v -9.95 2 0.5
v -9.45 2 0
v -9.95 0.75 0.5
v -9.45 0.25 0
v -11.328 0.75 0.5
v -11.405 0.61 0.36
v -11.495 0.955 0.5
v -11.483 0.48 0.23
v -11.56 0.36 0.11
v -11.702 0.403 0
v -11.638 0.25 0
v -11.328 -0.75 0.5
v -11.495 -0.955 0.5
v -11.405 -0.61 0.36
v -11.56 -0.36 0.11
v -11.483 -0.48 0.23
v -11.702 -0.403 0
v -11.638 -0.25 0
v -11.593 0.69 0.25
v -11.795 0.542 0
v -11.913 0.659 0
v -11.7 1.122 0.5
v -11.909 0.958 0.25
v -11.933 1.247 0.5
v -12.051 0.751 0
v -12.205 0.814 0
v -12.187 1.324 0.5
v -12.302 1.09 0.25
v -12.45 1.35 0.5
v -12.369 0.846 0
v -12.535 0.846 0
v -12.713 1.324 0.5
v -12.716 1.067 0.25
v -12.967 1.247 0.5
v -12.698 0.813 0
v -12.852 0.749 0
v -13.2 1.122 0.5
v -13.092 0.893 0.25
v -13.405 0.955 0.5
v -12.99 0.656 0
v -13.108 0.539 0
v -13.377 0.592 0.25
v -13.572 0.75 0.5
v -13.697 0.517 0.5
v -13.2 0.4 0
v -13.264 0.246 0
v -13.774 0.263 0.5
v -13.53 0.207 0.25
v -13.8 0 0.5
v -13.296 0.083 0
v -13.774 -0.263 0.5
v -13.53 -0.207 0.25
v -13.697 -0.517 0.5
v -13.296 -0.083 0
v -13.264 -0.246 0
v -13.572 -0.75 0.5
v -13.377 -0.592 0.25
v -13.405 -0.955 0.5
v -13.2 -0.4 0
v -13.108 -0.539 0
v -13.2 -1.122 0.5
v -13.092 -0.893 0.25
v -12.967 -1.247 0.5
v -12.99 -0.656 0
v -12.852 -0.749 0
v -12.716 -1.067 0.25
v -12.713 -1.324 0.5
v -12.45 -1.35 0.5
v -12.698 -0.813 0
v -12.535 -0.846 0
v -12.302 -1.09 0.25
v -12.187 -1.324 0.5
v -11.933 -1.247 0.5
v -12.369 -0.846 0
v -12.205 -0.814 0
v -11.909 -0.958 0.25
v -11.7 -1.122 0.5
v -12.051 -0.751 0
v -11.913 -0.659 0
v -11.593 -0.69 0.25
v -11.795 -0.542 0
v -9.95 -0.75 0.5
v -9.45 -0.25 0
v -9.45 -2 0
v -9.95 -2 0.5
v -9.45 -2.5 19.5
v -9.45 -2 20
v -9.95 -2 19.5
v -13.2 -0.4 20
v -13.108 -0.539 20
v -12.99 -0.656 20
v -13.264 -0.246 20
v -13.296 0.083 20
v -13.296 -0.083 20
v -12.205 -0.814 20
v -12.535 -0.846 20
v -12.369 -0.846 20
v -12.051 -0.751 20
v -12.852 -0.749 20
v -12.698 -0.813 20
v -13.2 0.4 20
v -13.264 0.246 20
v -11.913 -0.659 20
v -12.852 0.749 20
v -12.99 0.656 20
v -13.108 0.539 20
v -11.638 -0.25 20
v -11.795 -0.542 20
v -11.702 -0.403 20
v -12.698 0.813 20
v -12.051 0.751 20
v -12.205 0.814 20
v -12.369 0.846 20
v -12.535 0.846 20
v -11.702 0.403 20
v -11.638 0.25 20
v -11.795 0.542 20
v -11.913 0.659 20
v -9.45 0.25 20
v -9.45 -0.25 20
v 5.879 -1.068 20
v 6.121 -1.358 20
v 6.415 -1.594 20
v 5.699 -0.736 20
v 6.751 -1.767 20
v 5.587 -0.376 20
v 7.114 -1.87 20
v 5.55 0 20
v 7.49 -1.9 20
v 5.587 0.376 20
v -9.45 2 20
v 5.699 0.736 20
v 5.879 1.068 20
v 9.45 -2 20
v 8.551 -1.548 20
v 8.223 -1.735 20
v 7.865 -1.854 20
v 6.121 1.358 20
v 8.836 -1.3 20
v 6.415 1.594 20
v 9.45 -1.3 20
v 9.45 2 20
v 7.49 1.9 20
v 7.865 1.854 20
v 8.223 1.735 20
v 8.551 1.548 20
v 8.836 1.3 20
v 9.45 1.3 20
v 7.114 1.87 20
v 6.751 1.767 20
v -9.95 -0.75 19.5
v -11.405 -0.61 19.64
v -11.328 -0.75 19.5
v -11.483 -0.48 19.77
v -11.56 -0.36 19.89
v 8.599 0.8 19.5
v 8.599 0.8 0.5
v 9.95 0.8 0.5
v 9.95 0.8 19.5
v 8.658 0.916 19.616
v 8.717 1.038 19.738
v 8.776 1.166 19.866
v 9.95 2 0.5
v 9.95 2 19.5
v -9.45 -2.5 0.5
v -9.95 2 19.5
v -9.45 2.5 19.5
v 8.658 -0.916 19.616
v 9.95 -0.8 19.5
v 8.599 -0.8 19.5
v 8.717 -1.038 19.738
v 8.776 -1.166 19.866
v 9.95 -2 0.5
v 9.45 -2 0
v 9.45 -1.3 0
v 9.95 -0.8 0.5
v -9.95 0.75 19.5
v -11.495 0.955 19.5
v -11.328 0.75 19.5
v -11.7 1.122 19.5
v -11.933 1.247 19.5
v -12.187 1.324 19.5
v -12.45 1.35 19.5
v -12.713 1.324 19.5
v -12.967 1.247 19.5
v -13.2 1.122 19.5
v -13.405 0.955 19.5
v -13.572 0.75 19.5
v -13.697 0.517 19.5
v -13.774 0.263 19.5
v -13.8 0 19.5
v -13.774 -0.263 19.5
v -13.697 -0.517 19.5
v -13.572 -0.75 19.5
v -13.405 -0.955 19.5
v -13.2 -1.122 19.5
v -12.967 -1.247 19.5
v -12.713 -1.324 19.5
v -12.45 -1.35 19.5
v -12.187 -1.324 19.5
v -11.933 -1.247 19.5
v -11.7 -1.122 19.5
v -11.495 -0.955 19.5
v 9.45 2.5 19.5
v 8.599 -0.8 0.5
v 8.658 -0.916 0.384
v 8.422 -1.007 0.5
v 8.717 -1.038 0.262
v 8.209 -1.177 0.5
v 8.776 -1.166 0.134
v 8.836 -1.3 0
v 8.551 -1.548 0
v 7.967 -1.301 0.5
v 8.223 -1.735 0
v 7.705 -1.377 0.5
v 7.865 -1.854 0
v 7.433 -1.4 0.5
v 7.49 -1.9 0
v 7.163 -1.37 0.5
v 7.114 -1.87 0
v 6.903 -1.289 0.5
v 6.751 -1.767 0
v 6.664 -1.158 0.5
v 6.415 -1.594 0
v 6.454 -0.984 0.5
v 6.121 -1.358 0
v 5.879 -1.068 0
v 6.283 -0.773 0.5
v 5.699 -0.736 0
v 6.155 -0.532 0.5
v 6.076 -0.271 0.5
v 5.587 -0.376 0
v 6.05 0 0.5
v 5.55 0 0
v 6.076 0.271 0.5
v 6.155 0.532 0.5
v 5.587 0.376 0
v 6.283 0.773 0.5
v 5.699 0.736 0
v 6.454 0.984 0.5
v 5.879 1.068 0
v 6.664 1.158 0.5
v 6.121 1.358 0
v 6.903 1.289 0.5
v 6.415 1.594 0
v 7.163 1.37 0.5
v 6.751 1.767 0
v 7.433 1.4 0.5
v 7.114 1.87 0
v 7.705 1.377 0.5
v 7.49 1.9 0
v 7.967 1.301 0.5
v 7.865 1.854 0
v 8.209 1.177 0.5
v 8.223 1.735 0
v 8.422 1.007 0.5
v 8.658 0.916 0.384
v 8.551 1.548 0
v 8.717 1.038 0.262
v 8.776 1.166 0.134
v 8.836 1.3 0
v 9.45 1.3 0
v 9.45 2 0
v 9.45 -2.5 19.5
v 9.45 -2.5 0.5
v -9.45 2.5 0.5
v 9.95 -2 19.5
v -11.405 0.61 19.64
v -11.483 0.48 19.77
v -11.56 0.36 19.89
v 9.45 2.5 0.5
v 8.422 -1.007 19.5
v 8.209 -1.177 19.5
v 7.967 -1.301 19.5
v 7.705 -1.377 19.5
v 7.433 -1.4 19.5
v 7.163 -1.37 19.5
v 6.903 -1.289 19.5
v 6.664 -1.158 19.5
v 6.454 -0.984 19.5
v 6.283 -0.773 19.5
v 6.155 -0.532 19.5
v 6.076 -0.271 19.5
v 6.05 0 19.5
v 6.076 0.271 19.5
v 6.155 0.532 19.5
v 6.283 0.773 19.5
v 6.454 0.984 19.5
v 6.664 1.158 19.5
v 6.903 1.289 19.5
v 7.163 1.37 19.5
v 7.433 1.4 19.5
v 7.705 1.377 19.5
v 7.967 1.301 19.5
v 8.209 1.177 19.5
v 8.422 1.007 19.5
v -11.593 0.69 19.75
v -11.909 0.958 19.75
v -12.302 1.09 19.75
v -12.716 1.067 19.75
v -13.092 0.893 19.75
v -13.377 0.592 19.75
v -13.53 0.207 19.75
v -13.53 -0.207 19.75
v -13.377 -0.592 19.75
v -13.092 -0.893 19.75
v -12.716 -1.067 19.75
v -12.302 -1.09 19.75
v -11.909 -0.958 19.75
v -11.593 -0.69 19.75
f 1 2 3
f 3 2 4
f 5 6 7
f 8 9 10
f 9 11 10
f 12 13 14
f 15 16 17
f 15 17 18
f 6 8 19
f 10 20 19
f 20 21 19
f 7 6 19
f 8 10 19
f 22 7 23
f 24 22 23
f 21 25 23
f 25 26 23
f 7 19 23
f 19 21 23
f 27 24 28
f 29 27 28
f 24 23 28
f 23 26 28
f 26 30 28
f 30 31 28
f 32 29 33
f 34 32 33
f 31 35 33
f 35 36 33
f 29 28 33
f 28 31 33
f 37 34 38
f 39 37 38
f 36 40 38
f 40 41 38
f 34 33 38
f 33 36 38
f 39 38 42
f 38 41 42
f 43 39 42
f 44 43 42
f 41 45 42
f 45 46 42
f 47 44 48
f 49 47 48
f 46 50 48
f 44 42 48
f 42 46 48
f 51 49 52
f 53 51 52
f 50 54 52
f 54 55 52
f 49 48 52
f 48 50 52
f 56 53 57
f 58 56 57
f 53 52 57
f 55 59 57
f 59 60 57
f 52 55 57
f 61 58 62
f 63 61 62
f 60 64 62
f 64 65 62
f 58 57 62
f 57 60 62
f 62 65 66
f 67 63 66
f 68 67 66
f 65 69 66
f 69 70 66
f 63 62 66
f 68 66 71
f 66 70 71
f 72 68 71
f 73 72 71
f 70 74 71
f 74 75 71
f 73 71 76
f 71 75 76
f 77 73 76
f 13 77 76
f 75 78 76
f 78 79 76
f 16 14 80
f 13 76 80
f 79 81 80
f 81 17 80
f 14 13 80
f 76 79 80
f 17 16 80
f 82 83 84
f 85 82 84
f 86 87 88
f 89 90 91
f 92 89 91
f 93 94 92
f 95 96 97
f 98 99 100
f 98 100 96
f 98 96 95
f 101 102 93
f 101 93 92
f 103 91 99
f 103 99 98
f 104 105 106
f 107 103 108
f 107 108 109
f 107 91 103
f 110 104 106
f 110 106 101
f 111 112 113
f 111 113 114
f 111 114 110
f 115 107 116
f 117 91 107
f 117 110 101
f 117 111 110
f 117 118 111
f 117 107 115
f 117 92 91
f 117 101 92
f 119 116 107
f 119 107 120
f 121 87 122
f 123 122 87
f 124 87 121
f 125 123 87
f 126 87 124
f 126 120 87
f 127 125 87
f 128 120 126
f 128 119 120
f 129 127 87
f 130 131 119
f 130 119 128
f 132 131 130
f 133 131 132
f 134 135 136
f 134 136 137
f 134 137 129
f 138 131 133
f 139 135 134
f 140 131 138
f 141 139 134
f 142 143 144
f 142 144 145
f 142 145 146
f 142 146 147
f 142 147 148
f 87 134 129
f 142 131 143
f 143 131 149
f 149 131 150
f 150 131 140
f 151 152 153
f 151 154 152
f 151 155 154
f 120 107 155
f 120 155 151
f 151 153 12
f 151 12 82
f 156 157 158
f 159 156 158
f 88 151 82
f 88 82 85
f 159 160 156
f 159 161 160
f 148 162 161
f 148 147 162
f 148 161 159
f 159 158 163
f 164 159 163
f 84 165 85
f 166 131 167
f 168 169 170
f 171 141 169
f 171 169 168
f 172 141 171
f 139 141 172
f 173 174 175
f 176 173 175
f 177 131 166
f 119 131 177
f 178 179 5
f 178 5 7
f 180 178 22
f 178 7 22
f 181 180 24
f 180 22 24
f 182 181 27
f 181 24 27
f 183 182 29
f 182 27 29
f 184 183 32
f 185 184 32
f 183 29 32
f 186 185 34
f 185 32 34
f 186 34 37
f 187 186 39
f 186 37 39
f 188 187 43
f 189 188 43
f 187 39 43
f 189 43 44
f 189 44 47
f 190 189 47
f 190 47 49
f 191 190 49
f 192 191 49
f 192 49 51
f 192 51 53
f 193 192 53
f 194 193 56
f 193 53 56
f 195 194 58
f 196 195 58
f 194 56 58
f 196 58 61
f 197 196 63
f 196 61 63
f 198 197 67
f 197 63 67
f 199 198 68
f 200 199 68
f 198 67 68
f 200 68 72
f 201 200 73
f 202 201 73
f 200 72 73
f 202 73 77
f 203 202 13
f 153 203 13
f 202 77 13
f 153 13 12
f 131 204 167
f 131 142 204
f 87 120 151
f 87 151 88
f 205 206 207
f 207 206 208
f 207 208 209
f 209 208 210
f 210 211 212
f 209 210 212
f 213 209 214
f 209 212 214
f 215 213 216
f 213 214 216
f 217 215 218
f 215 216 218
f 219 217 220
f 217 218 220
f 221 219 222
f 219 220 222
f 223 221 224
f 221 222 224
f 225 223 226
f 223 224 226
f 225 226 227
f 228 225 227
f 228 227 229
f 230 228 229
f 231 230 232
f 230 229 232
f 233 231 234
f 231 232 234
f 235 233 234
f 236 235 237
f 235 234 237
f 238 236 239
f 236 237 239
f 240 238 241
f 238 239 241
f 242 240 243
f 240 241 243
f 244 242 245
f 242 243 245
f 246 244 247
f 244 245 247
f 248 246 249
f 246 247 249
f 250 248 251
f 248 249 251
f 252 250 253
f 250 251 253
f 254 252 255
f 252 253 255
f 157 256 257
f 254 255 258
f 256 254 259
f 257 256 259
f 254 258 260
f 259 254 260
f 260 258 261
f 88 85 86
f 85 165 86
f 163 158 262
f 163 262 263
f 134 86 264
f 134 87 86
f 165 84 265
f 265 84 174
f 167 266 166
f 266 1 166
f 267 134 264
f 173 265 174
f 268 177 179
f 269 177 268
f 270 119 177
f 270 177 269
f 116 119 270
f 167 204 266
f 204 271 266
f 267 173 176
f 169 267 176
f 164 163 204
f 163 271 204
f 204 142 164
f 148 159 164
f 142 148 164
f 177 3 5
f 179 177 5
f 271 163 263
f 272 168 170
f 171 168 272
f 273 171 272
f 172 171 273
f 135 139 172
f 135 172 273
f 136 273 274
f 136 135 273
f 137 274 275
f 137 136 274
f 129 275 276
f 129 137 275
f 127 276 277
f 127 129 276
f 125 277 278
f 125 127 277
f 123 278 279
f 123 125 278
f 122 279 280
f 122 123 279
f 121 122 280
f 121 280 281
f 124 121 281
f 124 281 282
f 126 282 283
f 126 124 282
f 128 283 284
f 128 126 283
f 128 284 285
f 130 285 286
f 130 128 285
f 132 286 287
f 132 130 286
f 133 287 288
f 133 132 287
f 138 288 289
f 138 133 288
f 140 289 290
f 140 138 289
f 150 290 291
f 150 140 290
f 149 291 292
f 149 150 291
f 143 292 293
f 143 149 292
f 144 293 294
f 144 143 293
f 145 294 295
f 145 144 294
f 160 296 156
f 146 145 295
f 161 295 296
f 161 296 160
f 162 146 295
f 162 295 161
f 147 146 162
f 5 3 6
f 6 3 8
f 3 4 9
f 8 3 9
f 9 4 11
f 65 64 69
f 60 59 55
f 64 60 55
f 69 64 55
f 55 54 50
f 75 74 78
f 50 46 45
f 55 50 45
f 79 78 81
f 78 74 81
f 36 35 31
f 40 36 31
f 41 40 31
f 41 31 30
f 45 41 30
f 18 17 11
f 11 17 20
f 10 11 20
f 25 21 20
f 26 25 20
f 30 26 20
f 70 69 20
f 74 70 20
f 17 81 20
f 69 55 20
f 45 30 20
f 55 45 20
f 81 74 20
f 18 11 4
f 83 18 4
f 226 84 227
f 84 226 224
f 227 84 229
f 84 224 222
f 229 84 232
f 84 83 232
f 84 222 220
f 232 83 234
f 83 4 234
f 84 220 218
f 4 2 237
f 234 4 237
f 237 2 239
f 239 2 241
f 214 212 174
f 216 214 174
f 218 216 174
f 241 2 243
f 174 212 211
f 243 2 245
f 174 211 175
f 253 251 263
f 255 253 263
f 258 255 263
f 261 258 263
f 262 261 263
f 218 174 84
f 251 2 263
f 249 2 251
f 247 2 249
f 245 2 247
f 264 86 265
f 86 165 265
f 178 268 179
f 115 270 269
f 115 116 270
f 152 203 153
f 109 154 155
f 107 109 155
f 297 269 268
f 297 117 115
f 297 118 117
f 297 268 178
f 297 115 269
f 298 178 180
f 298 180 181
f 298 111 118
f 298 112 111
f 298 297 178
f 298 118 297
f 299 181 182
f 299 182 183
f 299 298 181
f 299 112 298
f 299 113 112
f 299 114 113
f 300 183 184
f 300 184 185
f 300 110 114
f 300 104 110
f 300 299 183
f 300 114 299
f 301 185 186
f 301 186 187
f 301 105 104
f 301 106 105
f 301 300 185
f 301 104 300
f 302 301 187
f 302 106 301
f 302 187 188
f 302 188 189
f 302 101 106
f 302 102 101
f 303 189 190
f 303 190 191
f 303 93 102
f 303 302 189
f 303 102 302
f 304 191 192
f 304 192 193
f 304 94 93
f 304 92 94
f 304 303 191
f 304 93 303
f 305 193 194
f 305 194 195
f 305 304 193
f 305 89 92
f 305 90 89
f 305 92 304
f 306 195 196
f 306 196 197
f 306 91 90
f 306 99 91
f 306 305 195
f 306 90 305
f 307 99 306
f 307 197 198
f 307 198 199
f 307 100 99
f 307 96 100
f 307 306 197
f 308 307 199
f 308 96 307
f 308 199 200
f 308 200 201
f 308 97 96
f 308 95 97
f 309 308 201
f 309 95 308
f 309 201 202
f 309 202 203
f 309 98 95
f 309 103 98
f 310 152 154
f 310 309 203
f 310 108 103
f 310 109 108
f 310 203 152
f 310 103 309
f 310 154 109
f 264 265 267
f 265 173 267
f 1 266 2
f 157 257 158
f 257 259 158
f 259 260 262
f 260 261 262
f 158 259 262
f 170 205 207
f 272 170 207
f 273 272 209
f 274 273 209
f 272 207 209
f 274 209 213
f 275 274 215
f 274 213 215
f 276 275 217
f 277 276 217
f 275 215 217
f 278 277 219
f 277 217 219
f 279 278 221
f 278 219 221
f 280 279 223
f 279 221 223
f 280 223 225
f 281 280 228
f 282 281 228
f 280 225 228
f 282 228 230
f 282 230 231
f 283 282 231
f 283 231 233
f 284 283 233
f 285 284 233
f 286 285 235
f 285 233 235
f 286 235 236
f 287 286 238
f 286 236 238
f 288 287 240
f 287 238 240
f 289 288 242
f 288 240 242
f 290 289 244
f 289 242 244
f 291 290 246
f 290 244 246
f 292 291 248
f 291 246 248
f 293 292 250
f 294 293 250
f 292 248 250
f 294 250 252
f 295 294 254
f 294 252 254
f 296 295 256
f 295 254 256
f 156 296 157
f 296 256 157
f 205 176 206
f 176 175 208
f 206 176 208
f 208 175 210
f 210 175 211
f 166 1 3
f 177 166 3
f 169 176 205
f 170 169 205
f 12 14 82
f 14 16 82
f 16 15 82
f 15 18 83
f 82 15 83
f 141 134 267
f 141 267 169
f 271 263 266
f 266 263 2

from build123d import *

# Parameters (mm, degrees)
F1_DEPTH = 20
F2_SIZE  = 0.5


with BuildPart() as f1:
    # F0 (on Top) → F1 (new body)
    with BuildSketch(Plane.XY):
        with BuildLine():
            Line((9.95, 2.5), (-9.95, 2.5))
            Line((-9.95, 2.5), (-9.95, 0.75))
            Line((-9.95, 0.75), (-9.95, 0))
            Line((-9.95, 0), (-9.95, -0.75))
            Line((-9.95, -0.75), (-9.95, -2.5))
            Line((-9.95, -2.5), (9.95, -2.5))
            Line((9.95, -2.5), (9.95, -0.8))
            Line((9.95, -0.8), (8.5989125293, -0.8))
            ThreePointArc((8.5989125293, -0.8), (6.05, 0), (8.5989125293, 0.8))
            Line((8.5989125293, 0.8), (9.95, 0.8))
            Line((9.95, 0.8), (9.95, 2.5))
        make_face()
        with BuildLine():
            Line((-9.95, 0), (-9.95, 0.75))
            Line((-9.95, 0.75), (-11.327502784, 0.75))
            ThreePointArc((-11.327502784, 0.75), (-11.158127088, 0.391872912), (-11.1, 0))
            Line((-11.1, 0), (-9.95, 0))
        make_face()
        with BuildLine():
            ThreePointArc((-11.327502784, -0.75), (-11.158127088, -0.391872912), (-11.1, 0))
            Line((-11.1, 0), (-12.45, 0))
            Line((-12.45, 0), (-12.45, -0.75))
            Line((-12.45, -0.75), (-11.327502784, -0.75))
        make_face()
        with BuildLine():
            Line((-9.95, -0.75), (-9.95, 0))
            Line((-9.95, 0), (-11.1, 0))
            ThreePointArc((-11.1, 0), (-11.158127088, -0.391872912), (-11.327502784, -0.75))
            Line((-11.327502784, -0.75), (-9.95, -0.75))
        make_face()
        with BuildLine():
            Line((-12.45, 0.75), (-11.327502784, 0.75))
            ThreePointArc((-11.327502784, 0.75), (-13.8, 0), (-11.327502784, -0.75))
            Line((-11.327502784, -0.75), (-12.45, -0.75))
            Line((-12.45, -0.75), (-12.45, 0))
            Line((-12.45, 0), (-12.45, 0.75))
        make_face()
        with BuildLine():
            ThreePointArc((-11.1, 0), (-11.158127088, 0.391872912), (-11.327502784, 0.75))
            Line((-11.327502784, 0.75), (-12.45, 0.75))
            Line((-12.45, 0.75), (-12.45, 0))
            Line((-12.45, 0), (-11.1, 0))
        make_face()
    extrude(amount=F1_DEPTH)

    # F2
    f2_edges = [f1.edges().sort_by_distance(p)[0] for p in [
        (0, -2.5, 20),
        (-9.95, -1.625, 20),
        (-10.638751, -0.75, 20),
        (-13.8, 0, 20),
        (-10.638751, 0.75, 20),
        (-9.95, 1.625, 20),
        (0, 2.5, 20),
        (9.95, 1.65, 20),
        (9.274456, 0.8, 20),
        (6.05, 0, 20),
        (9.274456, -0.8, 20),
        (9.95, -1.65, 20),
        (9.95, -2.5, 10),
        (9.95, 2.5, 10),
        (-9.95, -2.5, 10),
        (-9.95, 2.5, 10),
        (0, -2.5, 0),
        (9.95, -1.65, 0),
        (9.274456, -0.8, 0),
        (6.05, 0, 0),
        (9.274456, 0.8, 0),
        (9.95, 1.65, 0),
        (0, 2.5, 0),
        (-9.95, 1.625, 0),
        (-10.638751, 0.75, 0),
        (-10.638751, -0.75, 0),
        (-9.95, -1.625, 0),
        (-13.8, 0, 0),
    ]]
    chamfer(f2_edges, length=F2_SIZE)


solid = f1.part
